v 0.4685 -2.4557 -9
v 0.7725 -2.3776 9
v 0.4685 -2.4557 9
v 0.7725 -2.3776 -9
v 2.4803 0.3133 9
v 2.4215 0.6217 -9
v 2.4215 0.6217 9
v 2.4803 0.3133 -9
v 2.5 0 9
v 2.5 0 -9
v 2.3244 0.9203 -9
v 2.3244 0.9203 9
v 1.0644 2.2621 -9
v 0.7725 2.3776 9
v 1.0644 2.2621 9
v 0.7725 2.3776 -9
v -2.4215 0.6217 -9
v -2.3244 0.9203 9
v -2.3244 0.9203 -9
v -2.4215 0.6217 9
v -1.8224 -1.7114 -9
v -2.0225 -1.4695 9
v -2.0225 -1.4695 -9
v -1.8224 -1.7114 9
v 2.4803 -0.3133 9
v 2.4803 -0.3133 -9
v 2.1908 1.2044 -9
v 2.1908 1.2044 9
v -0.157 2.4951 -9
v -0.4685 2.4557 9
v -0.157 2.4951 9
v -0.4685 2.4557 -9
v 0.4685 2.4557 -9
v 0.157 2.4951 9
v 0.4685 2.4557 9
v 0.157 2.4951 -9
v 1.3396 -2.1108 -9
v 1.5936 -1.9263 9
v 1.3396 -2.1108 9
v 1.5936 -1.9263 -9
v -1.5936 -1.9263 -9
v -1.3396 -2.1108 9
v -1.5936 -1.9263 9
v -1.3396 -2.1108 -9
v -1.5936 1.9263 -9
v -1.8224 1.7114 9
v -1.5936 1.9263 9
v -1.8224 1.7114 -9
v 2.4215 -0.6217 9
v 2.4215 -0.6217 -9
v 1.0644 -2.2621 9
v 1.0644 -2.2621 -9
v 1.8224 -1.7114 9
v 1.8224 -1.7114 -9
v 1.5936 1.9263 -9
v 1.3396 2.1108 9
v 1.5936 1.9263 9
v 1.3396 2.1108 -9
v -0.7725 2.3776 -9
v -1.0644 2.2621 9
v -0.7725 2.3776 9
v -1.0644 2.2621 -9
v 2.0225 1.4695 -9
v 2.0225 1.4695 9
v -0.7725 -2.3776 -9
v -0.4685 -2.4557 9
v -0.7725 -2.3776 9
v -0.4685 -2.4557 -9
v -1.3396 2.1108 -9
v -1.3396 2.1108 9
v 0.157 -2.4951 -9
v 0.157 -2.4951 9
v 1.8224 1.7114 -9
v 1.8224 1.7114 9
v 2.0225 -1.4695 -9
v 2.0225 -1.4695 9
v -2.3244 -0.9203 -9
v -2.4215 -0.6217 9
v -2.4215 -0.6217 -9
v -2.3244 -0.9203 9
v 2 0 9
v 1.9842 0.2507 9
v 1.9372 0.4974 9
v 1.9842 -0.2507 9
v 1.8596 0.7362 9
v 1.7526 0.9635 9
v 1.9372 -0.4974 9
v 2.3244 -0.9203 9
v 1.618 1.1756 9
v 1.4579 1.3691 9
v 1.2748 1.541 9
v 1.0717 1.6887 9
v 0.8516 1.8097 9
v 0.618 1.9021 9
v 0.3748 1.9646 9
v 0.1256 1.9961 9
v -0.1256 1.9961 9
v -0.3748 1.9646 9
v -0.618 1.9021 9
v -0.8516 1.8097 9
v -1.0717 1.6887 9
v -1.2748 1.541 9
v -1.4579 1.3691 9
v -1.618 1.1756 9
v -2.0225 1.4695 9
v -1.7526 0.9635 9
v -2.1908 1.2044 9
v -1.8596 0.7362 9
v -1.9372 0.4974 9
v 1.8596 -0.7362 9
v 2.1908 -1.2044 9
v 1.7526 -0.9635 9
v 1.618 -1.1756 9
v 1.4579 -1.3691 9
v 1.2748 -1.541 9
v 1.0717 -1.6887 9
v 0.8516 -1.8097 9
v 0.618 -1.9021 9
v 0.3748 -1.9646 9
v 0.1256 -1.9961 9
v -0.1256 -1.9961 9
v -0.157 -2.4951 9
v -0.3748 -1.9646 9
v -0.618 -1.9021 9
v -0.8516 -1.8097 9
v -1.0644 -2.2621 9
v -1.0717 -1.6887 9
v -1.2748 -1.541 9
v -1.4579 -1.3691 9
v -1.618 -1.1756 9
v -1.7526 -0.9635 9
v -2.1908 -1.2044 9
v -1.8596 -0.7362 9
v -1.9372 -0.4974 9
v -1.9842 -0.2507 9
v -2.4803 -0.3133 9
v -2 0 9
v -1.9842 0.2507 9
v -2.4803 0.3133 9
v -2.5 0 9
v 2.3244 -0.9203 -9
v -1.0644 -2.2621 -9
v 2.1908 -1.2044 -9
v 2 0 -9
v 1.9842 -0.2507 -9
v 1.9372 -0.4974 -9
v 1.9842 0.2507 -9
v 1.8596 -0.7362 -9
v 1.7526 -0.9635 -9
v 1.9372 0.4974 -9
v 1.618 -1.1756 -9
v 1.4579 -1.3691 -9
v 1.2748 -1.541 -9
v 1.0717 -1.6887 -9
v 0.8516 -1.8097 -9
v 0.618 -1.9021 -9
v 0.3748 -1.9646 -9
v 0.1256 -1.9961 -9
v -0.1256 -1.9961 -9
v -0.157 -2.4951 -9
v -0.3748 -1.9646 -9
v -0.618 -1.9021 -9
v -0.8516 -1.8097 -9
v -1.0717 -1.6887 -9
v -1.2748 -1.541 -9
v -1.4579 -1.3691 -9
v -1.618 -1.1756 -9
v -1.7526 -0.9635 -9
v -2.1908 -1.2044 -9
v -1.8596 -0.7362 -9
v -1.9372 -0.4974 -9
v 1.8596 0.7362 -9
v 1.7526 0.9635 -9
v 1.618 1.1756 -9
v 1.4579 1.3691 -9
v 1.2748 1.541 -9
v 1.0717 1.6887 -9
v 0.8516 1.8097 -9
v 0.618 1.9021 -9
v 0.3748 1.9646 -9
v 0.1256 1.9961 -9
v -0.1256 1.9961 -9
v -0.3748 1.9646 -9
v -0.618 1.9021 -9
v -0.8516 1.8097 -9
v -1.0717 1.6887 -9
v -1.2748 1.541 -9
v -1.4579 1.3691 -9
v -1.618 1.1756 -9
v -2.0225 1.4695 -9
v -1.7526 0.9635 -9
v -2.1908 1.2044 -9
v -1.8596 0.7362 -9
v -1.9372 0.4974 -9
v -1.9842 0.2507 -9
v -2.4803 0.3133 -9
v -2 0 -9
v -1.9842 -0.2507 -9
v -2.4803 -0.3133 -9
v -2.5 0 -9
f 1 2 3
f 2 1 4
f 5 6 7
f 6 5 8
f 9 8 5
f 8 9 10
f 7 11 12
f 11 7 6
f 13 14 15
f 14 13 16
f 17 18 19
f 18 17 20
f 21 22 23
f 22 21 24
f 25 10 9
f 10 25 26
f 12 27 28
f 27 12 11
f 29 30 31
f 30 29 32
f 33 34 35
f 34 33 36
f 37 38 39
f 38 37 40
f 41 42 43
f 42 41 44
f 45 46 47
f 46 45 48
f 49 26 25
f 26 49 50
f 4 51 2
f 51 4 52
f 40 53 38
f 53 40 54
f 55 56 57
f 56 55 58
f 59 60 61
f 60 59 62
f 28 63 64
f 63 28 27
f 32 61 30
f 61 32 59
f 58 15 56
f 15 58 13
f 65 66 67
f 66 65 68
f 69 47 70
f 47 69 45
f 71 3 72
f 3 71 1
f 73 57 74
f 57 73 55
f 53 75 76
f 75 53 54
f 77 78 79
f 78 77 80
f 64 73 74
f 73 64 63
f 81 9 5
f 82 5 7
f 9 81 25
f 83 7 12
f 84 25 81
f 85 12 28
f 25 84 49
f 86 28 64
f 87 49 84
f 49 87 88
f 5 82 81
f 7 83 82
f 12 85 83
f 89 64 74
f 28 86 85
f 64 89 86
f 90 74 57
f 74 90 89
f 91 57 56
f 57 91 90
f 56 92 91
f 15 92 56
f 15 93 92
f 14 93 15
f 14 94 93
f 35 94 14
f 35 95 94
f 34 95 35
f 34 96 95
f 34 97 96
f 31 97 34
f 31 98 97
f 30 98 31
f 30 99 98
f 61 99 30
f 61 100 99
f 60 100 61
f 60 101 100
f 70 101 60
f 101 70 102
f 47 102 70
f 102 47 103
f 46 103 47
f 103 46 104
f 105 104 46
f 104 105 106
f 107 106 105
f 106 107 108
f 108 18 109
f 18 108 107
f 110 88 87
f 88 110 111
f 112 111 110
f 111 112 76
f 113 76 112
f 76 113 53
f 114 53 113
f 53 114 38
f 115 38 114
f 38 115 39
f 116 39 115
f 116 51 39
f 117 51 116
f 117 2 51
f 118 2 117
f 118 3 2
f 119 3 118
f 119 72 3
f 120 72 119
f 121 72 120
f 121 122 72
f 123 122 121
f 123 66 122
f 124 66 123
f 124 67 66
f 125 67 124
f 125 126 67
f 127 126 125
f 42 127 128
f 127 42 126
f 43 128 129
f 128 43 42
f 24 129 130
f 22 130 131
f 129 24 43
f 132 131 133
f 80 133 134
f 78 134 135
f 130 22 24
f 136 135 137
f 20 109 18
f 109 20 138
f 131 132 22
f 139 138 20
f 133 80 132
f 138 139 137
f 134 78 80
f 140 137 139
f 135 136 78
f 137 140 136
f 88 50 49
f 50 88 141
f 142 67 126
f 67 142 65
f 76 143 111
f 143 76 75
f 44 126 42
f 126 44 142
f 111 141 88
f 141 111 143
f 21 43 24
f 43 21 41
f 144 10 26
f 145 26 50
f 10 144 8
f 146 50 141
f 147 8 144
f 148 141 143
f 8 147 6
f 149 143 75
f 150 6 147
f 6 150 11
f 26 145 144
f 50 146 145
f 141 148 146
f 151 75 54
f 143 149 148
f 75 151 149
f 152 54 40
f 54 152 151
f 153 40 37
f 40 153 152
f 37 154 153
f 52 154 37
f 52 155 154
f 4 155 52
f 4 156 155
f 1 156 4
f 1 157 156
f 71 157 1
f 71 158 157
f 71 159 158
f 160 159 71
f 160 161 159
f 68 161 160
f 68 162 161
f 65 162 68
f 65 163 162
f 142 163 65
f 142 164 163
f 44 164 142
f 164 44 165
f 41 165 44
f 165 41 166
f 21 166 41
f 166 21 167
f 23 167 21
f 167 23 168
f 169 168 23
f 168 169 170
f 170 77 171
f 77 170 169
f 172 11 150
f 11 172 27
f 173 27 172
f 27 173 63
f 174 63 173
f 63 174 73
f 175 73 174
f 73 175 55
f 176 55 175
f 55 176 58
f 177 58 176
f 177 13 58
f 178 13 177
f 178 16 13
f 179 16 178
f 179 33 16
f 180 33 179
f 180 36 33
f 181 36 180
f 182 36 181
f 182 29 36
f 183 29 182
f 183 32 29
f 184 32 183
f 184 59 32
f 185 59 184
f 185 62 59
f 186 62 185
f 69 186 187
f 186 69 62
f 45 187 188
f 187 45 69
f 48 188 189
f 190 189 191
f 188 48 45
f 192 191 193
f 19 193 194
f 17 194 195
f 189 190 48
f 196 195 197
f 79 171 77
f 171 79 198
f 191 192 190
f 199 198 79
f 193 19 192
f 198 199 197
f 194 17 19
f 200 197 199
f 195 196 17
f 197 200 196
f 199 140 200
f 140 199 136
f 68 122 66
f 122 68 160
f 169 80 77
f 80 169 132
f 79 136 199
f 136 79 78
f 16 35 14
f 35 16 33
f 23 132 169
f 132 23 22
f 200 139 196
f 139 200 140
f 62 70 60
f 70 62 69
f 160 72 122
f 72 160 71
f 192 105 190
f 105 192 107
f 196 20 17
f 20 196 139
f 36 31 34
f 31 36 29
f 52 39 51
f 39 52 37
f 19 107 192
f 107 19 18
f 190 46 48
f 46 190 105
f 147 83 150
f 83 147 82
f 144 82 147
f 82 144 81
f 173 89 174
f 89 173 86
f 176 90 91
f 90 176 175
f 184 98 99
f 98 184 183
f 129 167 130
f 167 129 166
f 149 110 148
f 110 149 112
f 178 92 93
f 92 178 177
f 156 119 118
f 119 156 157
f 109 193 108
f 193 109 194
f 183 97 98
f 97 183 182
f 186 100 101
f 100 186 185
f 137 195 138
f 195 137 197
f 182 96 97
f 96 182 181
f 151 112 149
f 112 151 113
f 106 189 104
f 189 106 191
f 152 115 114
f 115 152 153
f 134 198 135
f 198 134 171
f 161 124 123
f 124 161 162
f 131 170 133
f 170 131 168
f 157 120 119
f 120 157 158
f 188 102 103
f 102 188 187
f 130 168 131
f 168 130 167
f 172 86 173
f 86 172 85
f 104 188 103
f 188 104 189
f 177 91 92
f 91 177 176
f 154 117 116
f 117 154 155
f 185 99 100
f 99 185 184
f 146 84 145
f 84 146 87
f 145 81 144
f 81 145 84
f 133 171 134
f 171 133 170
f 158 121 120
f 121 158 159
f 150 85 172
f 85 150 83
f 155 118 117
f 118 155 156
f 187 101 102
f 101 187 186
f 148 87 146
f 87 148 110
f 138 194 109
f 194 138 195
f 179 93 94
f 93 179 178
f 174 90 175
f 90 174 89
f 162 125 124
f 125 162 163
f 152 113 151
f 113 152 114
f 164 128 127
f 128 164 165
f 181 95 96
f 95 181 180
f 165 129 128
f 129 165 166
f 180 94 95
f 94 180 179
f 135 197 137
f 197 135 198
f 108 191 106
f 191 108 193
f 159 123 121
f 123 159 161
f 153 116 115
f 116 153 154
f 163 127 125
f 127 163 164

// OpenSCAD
$fn = 50;


difference() {
	union() {
		translate(v = [0, 0, -9.0000000000]) {
			cylinder(h = 18, r = 2.5000000000);
		}
	}
	union() {
		translate(v = [0, 0, -100.0000000000]) {
			cylinder(h = 200, r = 2.0000000000);
		}
	}
}
